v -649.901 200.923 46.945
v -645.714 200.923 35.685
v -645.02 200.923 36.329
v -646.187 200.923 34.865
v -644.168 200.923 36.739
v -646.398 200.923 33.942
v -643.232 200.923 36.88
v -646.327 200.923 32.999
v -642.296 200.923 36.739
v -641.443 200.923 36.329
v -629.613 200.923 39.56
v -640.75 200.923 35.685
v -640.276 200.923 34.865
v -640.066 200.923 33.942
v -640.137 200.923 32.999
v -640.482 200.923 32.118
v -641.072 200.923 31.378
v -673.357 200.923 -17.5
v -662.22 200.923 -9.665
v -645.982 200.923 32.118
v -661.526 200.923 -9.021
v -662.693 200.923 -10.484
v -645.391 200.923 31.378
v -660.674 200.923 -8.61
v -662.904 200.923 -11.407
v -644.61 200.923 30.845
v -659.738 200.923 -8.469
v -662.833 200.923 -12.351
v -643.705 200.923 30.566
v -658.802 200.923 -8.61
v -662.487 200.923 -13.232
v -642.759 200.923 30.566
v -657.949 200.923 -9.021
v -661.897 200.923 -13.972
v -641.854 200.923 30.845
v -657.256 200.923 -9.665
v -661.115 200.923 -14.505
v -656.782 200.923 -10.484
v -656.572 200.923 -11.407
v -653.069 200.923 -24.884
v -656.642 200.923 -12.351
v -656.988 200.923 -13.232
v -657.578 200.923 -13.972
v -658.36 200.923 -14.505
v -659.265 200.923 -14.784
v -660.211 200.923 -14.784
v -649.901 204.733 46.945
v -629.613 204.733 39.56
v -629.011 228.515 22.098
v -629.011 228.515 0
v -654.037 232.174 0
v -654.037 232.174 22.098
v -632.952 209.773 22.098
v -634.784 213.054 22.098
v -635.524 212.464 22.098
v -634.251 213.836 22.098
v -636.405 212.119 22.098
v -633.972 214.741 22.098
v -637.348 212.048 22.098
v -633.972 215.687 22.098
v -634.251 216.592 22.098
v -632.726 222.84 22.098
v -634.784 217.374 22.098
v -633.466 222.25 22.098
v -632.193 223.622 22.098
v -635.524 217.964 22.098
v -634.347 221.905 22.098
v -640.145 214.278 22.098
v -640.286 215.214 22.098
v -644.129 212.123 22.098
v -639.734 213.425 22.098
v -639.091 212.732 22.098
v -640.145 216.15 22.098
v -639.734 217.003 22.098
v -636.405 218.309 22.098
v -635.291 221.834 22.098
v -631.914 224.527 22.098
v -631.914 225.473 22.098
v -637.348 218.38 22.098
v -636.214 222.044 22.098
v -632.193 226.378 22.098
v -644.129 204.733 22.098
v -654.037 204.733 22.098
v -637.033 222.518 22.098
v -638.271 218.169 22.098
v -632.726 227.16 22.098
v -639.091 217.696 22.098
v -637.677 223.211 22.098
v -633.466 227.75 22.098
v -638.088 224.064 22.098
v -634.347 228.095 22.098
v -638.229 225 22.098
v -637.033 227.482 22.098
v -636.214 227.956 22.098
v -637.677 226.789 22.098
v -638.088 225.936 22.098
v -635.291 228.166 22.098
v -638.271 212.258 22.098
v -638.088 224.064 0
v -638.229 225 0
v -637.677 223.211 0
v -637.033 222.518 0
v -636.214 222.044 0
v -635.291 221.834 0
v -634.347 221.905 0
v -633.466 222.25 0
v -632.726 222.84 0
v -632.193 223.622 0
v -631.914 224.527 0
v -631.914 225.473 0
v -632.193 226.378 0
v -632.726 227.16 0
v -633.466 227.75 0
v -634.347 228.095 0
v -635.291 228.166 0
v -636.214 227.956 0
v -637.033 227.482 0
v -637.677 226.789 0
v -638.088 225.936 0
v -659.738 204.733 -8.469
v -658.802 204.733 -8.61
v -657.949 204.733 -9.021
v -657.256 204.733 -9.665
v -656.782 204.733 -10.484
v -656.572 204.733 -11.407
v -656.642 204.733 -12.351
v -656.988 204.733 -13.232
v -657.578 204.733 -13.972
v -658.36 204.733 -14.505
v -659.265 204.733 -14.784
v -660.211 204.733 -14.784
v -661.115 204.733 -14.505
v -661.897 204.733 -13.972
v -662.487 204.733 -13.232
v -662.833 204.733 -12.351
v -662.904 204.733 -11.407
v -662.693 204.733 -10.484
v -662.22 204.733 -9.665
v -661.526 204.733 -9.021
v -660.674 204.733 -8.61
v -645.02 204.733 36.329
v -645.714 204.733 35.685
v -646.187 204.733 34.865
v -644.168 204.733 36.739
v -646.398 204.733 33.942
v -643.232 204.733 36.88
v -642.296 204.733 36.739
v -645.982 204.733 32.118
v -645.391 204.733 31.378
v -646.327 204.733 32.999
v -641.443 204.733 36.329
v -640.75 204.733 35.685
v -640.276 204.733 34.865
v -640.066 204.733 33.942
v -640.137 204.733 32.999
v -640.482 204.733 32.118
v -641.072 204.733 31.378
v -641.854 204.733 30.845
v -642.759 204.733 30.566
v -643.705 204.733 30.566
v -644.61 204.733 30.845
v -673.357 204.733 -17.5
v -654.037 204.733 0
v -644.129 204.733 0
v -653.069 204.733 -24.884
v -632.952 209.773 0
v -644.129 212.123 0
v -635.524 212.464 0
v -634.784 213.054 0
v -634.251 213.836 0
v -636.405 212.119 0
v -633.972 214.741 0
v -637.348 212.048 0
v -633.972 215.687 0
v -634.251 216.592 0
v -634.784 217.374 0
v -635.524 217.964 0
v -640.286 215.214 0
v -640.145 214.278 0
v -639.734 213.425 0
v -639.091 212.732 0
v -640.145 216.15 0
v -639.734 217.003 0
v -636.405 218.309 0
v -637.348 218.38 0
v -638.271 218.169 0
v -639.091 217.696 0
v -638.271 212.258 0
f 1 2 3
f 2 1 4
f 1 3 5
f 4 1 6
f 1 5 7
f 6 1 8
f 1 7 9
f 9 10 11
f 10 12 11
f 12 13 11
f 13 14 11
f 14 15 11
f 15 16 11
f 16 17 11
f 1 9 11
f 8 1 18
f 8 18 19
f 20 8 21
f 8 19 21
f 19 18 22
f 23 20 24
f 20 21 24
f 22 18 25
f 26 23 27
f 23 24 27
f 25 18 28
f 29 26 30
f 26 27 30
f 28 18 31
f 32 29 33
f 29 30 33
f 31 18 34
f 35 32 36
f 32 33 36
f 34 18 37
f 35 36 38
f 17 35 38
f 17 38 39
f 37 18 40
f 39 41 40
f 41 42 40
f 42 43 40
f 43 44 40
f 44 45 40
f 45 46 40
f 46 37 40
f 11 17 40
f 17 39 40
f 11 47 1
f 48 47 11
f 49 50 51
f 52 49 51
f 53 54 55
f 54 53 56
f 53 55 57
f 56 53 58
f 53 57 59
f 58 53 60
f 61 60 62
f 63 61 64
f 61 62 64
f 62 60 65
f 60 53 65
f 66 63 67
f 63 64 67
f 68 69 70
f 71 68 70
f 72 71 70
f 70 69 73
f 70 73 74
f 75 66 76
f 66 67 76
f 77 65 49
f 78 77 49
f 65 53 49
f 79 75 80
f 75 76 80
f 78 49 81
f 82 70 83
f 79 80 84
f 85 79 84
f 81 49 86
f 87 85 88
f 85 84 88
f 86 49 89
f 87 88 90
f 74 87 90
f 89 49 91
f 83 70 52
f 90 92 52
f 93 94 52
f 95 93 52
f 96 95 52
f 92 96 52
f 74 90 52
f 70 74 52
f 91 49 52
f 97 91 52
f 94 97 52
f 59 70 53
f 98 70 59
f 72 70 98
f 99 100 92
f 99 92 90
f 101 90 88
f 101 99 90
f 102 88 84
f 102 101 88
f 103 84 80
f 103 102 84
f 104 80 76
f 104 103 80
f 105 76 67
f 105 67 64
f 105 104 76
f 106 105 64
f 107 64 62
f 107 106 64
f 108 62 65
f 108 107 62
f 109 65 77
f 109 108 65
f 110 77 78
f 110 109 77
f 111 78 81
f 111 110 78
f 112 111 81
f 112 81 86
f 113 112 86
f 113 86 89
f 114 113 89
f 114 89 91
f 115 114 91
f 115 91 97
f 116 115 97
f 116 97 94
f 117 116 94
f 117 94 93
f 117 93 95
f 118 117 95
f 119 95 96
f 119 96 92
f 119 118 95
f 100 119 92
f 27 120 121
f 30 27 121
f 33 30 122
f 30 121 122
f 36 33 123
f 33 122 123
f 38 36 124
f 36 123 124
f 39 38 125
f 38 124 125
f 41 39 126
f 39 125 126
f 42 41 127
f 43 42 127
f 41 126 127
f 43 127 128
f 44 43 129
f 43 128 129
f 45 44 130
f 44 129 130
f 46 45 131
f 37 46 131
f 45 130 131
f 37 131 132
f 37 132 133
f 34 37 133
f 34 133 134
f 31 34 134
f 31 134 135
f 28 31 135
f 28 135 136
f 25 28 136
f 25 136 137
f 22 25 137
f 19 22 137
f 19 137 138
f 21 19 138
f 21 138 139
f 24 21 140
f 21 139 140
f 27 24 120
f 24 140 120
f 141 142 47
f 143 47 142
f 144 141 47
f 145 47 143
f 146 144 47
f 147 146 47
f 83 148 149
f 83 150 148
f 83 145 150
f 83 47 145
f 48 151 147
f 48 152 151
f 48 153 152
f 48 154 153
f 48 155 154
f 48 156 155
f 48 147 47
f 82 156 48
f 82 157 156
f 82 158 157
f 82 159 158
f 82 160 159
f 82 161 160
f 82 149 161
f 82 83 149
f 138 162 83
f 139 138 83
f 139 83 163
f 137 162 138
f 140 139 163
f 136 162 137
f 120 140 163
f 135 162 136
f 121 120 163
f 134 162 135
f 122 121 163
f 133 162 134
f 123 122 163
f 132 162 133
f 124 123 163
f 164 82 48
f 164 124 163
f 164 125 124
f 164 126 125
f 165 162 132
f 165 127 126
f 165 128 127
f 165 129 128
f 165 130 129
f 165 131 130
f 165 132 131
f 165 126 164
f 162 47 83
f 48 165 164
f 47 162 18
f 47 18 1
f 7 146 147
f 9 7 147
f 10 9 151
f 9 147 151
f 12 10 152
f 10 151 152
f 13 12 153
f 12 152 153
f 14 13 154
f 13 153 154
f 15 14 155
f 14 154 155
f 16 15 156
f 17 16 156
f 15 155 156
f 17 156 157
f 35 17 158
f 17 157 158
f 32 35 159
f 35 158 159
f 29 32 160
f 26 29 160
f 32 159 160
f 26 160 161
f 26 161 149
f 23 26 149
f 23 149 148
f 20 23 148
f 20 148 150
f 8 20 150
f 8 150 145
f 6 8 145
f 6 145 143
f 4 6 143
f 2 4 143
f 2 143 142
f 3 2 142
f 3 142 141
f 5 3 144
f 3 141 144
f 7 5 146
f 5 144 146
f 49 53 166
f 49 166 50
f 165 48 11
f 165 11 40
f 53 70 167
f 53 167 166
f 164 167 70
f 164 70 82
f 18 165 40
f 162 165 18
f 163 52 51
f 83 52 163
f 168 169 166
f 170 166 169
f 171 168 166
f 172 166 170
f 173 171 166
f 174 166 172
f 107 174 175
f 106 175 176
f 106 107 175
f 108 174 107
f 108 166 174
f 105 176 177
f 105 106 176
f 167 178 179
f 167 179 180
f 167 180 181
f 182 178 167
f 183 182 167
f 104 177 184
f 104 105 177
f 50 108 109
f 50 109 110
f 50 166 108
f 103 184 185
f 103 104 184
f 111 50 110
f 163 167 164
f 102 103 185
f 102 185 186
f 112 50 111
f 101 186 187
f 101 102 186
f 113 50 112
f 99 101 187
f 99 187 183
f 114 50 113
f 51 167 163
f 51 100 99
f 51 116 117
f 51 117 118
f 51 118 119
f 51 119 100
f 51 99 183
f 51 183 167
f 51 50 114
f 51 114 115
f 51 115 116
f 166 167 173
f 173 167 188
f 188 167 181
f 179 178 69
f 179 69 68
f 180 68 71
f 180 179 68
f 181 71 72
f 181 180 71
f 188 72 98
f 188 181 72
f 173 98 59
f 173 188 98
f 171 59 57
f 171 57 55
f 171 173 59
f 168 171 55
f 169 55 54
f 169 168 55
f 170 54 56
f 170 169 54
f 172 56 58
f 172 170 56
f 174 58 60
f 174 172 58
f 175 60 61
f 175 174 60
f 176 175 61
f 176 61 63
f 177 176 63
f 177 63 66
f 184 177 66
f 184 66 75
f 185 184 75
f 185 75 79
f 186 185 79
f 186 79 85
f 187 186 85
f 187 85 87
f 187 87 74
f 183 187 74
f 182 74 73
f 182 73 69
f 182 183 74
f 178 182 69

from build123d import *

# Parameters (mm, degrees)
SKETCH1_R            = 3.175
BOSS_EXTRUDE1_DEPTH  = 22.098
SKETCH2_W            = 6.364573253
SKETCH2_H            = 22.098
BOSS_EXTRUDE2_DEPTH  = 8.89
SKETCH12_R           = 3.175
BOSS_EXTRUDE6_DEPTH  = 3.81
BOSS_EXTRUDE12_DEPTH = 22.098
CUT_EXTRUDE1_DEPTH   = 35.052
BOSS_EXTRUDE13_DEPTH = 22.098


with BuildPart() as part:
    # Sketch1 → Boss-Extrude1 (new body)
    with BuildSketch(Plane.XY):
        Polygon((-629.011320926, 228.514758378), (-646.417262265, 232.174381811), (-650.357758597, 213.432549691), (-632.951817258, 209.772926258), align=None)
        with Locations(Location((-635.053635704, 225, 0), (0, 0, 180))):
            Circle(SKETCH1_R, mode=Mode.SUBTRACT)
        with Locations(Location((-637.11116423, 215.213960129, 0), (0, 0, 180))):
            Circle(SKETCH1_R, mode=Mode.SUBTRACT)
    extrude(amount=BOSS_EXTRUDE1_DEPTH)

    # Sketch2 → Boss-Extrude2 (add)
    with BuildSketch(Plane(origin=(15.442364745, 73.44714554, 0), x_dir=(0.9786039871389689, -0.20575285260650125, 0), z_dir=(-0.20575285260650128, -0.978603987138969, 0))):
        with Locations((-677.174764942, 11.049)):
            Rectangle(SKETCH2_W, SKETCH2_H)
    extrude(amount=BOSS_EXTRUDE2_DEPTH)

    # Sketch12 → Boss-Extrude6 (add)
    with BuildSketch(Plane(origin=(0, 204.732760245, 0), x_dir=(1, 0, 0), z_dir=(0, 1, 0))):
        Polygon((-673.35674497, 17.499509084), (-649.901003541, -46.94461085), (-629.613039858, -39.560395955), (-653.068781287, 24.883723978), align=None)
        with Locations(Location((-659.737838472, 11.644339504, 0), (0, 0, 270))):
            Circle(SKETCH12_R, mode=Mode.SUBTRACT)
        with Locations(Location((-643.231946355, -33.705226375, 0), (0, 0, 270))):
            Circle(SKETCH12_R, mode=Mode.SUBTRACT)
    extrude(amount=-BOSS_EXTRUDE6_DEPTH)

    # Sketch19 → Boss-Extrude12 (add)
    with BuildSketch(Plane.XY.offset(22.098)):
        Polygon((-646.417262265, 232.174381811), (-654.037262265, 232.174381811), (-654.037262265, 204.732760245), (-652.186901457, 204.732760245), align=None)
    extrude(amount=-BOSS_EXTRUDE12_DEPTH)

    # Sketch20 → Cut-Extrude1 (cut)
    with BuildSketch(Plane(origin=(0, 0, 0), x_dir=(-1, 0, 0), z_dir=(0, 0, -1))):
        Polygon((629.011320926, 228.514758378), (654.037262265, 232.174381811), (646.417262265, 232.174381811), align=None)
    extrude(amount=-CUT_EXTRUDE1_DEPTH, mode=Mode.SUBTRACT)

    # Sketch21 → Boss-Extrude13 (add)
    with BuildSketch(Plane(origin=(0, 0, 0), x_dir=(-1, 0, 0), z_dir=(0, 0, -1))):
        Polygon((644.129361835, 212.123020588), (644.129361835, 204.732760245), (645.683174376, 204.732760245), align=None)
    extrude(amount=-BOSS_EXTRUDE13_DEPTH)


solid = part.part
